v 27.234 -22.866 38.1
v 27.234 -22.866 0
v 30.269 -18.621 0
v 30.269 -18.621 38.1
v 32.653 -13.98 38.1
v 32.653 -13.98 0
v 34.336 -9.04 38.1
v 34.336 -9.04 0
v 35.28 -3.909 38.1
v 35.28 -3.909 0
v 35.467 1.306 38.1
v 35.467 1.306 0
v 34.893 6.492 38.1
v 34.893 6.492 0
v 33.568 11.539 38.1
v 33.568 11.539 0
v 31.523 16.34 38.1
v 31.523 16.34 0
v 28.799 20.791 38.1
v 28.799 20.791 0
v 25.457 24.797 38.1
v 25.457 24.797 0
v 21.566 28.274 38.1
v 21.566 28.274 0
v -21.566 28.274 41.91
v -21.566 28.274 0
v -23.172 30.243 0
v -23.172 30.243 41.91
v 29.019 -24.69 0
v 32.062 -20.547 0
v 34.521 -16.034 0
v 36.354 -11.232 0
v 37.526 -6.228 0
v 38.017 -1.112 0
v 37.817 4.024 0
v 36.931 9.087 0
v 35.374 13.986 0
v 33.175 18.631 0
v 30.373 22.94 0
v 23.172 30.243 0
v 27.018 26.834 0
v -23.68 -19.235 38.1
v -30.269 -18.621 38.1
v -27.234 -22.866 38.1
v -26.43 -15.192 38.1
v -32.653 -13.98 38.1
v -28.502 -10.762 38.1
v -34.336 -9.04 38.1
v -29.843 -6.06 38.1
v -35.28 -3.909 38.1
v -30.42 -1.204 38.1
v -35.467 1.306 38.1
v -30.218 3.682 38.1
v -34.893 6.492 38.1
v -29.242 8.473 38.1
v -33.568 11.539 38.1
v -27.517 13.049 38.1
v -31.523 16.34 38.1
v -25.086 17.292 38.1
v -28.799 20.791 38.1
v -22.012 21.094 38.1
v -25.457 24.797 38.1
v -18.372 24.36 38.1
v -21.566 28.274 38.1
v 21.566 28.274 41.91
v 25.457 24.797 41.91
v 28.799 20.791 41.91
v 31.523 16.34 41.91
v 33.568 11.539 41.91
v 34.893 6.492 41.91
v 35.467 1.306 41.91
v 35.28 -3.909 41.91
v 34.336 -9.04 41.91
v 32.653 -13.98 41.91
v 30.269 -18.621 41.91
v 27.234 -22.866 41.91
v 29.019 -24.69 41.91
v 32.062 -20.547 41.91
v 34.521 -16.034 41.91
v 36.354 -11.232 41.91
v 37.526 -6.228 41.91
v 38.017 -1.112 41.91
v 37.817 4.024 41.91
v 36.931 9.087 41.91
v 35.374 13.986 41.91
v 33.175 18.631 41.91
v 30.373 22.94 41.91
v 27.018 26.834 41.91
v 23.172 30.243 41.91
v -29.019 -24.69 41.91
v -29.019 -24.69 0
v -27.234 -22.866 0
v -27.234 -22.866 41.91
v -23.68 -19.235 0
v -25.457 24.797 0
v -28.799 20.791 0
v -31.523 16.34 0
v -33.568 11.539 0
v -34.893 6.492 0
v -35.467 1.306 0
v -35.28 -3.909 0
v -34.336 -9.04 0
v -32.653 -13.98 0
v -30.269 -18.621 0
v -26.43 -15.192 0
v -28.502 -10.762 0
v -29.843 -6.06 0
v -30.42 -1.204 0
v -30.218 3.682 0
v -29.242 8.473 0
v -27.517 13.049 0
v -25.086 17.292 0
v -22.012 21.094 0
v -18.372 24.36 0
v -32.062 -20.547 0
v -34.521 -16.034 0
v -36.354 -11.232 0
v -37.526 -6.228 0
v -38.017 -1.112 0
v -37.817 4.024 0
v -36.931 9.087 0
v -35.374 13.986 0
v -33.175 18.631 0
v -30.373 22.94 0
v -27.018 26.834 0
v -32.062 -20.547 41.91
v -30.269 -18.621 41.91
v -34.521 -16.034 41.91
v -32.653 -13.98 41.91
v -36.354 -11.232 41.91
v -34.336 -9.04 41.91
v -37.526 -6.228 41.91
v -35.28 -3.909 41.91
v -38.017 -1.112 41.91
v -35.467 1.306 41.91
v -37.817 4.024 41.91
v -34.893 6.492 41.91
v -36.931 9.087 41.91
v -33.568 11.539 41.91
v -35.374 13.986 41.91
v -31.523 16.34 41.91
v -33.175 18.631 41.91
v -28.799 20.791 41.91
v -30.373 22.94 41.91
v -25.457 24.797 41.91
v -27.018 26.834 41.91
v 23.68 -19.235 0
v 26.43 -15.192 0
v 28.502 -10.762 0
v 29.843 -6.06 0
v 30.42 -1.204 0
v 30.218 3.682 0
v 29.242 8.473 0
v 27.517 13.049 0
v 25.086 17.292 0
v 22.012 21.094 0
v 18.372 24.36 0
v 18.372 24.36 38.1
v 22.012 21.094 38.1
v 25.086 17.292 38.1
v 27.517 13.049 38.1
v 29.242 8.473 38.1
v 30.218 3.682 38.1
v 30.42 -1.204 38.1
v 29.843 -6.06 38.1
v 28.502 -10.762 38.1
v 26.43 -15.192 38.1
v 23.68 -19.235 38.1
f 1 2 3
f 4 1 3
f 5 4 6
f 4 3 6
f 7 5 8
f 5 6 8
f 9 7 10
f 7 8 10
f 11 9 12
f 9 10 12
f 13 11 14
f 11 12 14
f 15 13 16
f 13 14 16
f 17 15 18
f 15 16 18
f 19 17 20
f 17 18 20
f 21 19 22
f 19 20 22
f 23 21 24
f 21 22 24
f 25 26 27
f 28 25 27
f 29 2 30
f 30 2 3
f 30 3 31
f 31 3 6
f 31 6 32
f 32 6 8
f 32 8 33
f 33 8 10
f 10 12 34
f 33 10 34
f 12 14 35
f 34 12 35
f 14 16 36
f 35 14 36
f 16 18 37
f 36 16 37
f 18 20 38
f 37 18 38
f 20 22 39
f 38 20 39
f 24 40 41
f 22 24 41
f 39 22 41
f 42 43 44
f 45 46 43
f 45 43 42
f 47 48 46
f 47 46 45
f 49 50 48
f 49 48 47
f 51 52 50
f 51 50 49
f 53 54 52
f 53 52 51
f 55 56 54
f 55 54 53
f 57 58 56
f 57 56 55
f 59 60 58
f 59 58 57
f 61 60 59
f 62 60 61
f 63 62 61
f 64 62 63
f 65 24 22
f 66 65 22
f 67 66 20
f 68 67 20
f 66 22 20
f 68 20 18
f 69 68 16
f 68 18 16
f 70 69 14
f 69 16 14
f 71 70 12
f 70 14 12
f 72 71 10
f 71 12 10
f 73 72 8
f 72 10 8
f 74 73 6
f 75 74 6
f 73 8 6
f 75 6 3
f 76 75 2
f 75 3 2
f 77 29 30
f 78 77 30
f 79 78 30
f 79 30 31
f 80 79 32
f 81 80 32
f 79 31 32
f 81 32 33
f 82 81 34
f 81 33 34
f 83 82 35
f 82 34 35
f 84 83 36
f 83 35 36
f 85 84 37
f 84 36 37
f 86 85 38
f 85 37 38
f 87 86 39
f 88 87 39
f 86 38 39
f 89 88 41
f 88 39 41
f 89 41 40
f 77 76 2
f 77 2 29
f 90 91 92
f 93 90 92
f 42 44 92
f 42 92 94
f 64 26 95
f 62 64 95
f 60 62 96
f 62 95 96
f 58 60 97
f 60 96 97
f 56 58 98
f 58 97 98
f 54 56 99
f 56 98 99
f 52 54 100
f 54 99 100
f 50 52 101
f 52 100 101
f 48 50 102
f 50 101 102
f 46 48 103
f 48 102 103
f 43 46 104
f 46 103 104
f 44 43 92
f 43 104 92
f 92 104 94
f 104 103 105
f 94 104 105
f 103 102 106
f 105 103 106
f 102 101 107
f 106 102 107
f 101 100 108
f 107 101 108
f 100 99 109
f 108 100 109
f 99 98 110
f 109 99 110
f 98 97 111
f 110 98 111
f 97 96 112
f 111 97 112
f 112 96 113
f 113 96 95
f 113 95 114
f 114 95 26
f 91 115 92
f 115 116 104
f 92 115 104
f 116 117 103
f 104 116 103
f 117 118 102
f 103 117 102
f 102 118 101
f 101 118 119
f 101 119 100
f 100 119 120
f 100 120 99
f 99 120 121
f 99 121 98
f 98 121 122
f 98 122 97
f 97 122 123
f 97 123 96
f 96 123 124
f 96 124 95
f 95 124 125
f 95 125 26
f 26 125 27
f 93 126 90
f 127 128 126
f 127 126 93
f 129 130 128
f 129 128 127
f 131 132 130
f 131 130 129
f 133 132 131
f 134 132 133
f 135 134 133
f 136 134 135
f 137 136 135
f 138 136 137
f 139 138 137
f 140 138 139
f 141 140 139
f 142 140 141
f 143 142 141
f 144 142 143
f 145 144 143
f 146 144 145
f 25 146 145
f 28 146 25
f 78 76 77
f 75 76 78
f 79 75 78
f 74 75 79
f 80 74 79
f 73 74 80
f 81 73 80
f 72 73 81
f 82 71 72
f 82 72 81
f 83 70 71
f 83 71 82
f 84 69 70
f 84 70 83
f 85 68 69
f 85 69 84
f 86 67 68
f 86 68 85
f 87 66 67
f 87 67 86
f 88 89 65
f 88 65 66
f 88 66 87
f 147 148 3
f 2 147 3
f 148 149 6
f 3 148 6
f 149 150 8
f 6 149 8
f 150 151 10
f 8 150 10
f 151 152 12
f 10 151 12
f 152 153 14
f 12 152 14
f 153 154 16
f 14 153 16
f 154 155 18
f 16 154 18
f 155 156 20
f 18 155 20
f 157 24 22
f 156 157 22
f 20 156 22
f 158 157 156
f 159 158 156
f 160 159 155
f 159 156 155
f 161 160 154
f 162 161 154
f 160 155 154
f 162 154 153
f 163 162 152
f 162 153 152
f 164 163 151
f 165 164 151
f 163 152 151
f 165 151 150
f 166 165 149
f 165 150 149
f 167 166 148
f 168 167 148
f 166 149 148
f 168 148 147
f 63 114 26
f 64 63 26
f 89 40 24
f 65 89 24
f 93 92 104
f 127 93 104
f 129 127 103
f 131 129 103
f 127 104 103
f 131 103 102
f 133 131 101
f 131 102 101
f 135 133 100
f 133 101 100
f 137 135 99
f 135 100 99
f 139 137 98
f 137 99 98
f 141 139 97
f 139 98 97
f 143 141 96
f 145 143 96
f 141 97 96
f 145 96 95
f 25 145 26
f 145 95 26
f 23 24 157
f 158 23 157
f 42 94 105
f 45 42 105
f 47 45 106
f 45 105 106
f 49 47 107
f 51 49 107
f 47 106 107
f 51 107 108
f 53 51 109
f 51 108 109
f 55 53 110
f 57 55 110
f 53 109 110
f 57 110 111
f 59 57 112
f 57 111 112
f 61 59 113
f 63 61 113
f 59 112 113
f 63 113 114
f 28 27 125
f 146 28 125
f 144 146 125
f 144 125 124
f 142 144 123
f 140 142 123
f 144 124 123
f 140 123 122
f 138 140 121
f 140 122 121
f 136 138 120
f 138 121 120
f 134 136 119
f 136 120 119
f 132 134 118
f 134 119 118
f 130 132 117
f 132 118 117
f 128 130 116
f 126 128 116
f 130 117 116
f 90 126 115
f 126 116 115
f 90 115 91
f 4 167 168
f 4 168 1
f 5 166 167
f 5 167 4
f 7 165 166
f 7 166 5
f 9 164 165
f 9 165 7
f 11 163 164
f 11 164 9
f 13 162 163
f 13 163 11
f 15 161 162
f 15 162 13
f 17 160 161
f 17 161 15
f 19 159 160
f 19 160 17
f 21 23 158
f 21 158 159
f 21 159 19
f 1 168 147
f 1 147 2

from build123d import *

# Parameters (mm, degrees)
F2_DEPTH = 41.91
F3_DEPTH = 38.1


with BuildPart() as f2:
    # F1 (on Top) → F2 (new body)
    with BuildSketch(Plane.XY):
        with BuildLine():
            ThreePointArc((-27.233721, -22.865652), (-35.274824, 3.909651), (-21.565675, 28.274286))
            Line((-21.565675, 28.274286), (-23.171926, 30.243129))
            ThreePointArc((-23.171926, 30.243129), (-37.817299, 4.024376), (-29.019104, -24.689761))
            Line((-29.019104, -24.689761), (-27.233721, -22.865652))
        make_face()
        with BuildLine():
            Line((23.171926, 30.243129), (21.565675, 28.274286))
            ThreePointArc((21.565675, 28.274286), (35.274824, 3.909651), (27.233721, -22.865652))
            Line((27.233721, -22.865652), (29.019104, -24.689761))
            ThreePointArc((29.019104, -24.689761), (37.817299, 4.024376), (23.171926, 30.243129))
        make_face()
    extrude(amount=F2_DEPTH)


with BuildPart() as f3:
    # F1 (on Top) → F3 (new body)
    with BuildSketch(Plane.XY):
        with BuildLine():
            ThreePointArc((-23.680362, -19.23522), (-30.218301, 3.681646), (-18.372431, 24.360204))
            Line((-18.372431, 24.360204), (-21.565675, 28.274286))
            ThreePointArc((-21.565675, 28.274286), (-35.274824, 3.909651), (-27.233721, -22.865652))
            Line((-27.233721, -22.865652), (-23.680362, -19.23522))
        make_face()
        with BuildLine():
            Line((21.565675, 28.274286), (18.372431, 24.360204))
            ThreePointArc((18.372431, 24.360204), (30.218301, 3.681646), (23.680362, -19.23522))
            Line((23.680362, -19.23522), (27.233721, -22.865652))
            ThreePointArc((27.233721, -22.865652), (35.274824, 3.909651), (21.565675, 28.274286))
        make_face()
    extrude(amount=F3_DEPTH)


solid = Compound([f2.part, f3.part])
